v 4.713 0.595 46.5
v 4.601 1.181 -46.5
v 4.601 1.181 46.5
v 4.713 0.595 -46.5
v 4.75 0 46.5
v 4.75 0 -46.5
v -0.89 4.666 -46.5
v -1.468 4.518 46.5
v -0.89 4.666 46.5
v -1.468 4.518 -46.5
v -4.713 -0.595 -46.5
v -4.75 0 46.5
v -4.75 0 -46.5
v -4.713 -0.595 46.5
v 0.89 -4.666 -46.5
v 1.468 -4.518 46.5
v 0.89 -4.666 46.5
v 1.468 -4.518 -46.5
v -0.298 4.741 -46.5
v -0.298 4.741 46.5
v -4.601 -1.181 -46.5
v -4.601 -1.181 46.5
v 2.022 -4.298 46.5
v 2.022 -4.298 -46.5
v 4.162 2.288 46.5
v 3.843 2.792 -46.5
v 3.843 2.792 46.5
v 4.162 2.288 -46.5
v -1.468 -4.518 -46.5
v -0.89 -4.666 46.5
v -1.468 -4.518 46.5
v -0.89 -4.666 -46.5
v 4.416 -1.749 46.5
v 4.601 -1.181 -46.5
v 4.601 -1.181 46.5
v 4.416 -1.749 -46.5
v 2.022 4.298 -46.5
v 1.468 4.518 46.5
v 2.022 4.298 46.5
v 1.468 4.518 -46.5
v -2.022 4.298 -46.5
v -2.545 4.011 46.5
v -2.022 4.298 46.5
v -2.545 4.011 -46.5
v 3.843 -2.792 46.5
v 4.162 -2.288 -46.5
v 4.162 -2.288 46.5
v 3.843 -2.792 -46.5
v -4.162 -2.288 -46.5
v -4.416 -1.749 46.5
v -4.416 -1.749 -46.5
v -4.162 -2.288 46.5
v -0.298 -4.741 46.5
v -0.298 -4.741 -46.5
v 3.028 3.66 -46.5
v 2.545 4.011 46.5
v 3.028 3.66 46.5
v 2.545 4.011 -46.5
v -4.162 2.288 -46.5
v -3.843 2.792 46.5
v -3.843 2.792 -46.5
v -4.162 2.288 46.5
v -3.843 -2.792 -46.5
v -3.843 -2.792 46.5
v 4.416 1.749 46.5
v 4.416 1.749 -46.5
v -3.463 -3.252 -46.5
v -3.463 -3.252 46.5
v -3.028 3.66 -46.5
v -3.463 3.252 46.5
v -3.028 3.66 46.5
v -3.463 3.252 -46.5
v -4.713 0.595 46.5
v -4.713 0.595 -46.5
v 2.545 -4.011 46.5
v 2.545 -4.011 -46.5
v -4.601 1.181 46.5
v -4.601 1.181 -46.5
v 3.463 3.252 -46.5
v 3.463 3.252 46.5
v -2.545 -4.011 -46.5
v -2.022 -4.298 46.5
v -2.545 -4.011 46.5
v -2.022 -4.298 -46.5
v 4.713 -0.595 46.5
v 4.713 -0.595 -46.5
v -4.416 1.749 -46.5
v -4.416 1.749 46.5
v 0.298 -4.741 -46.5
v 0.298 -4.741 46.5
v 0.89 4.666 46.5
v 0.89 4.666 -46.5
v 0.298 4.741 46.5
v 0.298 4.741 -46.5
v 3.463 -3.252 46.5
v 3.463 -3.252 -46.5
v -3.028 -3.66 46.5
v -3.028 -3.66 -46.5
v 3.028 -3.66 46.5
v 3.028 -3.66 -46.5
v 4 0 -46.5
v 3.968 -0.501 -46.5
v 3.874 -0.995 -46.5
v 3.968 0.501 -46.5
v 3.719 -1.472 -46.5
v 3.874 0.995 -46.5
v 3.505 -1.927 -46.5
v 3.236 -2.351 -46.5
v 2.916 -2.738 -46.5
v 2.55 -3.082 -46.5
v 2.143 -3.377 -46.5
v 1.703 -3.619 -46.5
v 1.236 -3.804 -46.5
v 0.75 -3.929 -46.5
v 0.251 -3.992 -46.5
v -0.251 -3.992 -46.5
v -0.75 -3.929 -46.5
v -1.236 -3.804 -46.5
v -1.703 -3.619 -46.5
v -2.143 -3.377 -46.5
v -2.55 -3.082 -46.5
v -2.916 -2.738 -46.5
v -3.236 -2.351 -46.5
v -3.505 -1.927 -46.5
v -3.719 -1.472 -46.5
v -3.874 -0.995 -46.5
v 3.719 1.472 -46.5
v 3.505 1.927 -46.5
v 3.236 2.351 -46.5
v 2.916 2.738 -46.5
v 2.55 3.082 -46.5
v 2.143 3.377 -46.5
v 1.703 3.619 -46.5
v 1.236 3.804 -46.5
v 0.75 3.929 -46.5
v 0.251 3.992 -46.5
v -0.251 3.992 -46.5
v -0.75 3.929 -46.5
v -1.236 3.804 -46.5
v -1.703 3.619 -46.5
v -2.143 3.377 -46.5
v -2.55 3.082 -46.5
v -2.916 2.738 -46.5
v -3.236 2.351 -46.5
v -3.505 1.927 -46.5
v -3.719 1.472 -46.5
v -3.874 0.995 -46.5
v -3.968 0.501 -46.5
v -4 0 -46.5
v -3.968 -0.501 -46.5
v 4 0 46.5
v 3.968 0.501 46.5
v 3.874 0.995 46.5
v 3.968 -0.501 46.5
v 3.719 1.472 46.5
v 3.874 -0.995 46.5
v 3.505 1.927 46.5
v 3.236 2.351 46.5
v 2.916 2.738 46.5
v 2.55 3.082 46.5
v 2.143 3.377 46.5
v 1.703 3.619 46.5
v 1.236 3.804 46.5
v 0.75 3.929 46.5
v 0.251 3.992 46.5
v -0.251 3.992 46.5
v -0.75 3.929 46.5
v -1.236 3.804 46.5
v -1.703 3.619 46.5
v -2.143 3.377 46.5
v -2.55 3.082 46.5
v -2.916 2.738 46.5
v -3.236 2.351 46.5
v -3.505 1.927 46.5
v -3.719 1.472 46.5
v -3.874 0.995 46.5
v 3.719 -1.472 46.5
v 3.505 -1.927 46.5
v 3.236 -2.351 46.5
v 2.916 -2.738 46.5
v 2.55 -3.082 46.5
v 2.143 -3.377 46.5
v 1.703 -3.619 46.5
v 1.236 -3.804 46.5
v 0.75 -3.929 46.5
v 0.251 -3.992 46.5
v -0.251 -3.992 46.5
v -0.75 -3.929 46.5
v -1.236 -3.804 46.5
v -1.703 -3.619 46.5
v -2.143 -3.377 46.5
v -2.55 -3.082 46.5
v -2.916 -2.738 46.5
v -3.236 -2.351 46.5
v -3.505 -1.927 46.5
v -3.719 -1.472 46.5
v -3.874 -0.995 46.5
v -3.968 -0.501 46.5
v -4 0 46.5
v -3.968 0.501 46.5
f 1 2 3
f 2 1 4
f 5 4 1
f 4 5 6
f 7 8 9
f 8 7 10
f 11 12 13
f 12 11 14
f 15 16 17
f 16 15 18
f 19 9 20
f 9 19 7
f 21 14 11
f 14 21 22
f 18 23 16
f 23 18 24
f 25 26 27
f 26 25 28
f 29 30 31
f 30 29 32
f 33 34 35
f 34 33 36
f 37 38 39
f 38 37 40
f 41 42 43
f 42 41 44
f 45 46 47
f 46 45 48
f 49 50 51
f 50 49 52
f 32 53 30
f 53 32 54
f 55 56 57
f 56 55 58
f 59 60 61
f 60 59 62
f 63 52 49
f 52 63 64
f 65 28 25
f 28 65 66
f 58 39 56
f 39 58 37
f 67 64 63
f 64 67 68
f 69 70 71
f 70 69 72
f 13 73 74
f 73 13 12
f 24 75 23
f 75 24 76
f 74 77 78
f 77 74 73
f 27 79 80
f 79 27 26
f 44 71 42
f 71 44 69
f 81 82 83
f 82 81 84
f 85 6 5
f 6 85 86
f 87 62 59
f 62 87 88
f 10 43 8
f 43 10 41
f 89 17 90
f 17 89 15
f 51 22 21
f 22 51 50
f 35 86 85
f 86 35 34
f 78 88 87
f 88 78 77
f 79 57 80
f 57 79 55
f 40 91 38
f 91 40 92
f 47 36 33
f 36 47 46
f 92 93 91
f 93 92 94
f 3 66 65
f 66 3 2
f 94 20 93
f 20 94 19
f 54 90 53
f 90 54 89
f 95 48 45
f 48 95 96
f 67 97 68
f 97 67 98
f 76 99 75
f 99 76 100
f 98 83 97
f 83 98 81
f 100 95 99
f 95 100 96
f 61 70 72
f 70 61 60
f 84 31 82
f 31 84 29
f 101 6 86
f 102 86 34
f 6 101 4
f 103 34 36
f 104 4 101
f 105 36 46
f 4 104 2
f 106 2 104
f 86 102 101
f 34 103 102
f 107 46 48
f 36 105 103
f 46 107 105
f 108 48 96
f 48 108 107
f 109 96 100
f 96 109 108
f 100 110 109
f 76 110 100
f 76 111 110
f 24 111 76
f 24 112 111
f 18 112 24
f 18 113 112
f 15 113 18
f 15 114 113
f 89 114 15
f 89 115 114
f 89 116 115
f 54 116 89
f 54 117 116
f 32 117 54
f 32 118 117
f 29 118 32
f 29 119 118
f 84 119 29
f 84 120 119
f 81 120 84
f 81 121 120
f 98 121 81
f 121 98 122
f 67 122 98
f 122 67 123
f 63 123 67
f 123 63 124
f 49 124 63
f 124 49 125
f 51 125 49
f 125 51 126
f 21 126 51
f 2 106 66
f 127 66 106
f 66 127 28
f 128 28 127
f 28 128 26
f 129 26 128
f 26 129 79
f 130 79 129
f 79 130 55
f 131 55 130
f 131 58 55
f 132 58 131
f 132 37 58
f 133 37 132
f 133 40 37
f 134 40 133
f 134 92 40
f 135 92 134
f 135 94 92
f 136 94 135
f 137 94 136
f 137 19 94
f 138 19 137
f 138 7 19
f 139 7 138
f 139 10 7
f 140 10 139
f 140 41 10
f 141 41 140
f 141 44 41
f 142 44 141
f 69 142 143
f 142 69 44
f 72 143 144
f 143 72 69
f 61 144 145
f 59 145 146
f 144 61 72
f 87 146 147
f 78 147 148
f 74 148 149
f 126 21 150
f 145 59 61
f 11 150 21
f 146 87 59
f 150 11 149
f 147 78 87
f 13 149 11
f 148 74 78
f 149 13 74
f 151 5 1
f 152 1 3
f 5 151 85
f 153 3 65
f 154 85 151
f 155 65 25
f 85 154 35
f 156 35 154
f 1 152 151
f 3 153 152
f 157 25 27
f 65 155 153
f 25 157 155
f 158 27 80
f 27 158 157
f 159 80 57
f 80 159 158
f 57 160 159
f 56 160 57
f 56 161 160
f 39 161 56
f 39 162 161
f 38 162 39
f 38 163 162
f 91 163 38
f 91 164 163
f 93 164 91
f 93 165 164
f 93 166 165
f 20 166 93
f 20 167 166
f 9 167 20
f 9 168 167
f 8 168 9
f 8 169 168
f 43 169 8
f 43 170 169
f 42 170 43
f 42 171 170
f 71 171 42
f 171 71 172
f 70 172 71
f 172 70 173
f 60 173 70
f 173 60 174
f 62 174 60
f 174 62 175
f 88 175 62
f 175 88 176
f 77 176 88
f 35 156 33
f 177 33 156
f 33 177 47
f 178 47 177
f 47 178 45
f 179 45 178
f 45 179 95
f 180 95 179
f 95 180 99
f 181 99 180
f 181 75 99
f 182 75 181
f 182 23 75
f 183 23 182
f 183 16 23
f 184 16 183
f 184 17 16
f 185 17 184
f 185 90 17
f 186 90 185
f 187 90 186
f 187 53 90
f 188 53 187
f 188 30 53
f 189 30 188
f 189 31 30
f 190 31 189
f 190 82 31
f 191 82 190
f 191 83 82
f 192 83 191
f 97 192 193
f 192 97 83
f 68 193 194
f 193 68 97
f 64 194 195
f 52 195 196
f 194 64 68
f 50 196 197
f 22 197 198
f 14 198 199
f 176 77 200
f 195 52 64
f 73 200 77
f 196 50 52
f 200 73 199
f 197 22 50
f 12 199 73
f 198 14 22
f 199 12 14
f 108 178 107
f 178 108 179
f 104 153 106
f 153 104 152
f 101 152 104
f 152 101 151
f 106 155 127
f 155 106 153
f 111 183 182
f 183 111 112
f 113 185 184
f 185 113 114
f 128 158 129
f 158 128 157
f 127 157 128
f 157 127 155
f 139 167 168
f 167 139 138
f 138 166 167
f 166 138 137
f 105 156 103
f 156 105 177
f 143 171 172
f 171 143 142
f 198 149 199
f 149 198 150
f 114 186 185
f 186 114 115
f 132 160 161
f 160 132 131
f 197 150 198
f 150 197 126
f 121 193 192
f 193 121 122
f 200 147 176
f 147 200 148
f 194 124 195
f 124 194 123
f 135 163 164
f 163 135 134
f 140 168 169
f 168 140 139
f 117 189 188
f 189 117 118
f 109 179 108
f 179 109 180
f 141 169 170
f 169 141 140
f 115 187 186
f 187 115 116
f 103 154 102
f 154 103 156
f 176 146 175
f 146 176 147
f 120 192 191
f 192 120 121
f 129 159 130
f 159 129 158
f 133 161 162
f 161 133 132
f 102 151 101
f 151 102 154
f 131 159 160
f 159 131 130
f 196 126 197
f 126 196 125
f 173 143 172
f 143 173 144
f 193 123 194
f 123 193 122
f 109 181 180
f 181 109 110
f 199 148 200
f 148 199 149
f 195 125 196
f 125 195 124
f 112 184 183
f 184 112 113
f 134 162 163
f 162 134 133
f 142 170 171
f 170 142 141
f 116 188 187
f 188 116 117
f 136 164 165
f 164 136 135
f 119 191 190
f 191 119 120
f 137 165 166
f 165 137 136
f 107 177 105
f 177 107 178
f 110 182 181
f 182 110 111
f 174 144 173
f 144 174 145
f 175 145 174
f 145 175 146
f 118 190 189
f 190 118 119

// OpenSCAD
$fn = 50;


difference() {
	union() {
		translate(v = [0, 0, -46.5000000000]) {
			cylinder(h = 93, r = 4.7500000000);
		}
	}
	union() {
		translate(v = [0, 0, -100.0000000000]) {
			cylinder(h = 200, r = 4.0000000000);
		}
	}
}
